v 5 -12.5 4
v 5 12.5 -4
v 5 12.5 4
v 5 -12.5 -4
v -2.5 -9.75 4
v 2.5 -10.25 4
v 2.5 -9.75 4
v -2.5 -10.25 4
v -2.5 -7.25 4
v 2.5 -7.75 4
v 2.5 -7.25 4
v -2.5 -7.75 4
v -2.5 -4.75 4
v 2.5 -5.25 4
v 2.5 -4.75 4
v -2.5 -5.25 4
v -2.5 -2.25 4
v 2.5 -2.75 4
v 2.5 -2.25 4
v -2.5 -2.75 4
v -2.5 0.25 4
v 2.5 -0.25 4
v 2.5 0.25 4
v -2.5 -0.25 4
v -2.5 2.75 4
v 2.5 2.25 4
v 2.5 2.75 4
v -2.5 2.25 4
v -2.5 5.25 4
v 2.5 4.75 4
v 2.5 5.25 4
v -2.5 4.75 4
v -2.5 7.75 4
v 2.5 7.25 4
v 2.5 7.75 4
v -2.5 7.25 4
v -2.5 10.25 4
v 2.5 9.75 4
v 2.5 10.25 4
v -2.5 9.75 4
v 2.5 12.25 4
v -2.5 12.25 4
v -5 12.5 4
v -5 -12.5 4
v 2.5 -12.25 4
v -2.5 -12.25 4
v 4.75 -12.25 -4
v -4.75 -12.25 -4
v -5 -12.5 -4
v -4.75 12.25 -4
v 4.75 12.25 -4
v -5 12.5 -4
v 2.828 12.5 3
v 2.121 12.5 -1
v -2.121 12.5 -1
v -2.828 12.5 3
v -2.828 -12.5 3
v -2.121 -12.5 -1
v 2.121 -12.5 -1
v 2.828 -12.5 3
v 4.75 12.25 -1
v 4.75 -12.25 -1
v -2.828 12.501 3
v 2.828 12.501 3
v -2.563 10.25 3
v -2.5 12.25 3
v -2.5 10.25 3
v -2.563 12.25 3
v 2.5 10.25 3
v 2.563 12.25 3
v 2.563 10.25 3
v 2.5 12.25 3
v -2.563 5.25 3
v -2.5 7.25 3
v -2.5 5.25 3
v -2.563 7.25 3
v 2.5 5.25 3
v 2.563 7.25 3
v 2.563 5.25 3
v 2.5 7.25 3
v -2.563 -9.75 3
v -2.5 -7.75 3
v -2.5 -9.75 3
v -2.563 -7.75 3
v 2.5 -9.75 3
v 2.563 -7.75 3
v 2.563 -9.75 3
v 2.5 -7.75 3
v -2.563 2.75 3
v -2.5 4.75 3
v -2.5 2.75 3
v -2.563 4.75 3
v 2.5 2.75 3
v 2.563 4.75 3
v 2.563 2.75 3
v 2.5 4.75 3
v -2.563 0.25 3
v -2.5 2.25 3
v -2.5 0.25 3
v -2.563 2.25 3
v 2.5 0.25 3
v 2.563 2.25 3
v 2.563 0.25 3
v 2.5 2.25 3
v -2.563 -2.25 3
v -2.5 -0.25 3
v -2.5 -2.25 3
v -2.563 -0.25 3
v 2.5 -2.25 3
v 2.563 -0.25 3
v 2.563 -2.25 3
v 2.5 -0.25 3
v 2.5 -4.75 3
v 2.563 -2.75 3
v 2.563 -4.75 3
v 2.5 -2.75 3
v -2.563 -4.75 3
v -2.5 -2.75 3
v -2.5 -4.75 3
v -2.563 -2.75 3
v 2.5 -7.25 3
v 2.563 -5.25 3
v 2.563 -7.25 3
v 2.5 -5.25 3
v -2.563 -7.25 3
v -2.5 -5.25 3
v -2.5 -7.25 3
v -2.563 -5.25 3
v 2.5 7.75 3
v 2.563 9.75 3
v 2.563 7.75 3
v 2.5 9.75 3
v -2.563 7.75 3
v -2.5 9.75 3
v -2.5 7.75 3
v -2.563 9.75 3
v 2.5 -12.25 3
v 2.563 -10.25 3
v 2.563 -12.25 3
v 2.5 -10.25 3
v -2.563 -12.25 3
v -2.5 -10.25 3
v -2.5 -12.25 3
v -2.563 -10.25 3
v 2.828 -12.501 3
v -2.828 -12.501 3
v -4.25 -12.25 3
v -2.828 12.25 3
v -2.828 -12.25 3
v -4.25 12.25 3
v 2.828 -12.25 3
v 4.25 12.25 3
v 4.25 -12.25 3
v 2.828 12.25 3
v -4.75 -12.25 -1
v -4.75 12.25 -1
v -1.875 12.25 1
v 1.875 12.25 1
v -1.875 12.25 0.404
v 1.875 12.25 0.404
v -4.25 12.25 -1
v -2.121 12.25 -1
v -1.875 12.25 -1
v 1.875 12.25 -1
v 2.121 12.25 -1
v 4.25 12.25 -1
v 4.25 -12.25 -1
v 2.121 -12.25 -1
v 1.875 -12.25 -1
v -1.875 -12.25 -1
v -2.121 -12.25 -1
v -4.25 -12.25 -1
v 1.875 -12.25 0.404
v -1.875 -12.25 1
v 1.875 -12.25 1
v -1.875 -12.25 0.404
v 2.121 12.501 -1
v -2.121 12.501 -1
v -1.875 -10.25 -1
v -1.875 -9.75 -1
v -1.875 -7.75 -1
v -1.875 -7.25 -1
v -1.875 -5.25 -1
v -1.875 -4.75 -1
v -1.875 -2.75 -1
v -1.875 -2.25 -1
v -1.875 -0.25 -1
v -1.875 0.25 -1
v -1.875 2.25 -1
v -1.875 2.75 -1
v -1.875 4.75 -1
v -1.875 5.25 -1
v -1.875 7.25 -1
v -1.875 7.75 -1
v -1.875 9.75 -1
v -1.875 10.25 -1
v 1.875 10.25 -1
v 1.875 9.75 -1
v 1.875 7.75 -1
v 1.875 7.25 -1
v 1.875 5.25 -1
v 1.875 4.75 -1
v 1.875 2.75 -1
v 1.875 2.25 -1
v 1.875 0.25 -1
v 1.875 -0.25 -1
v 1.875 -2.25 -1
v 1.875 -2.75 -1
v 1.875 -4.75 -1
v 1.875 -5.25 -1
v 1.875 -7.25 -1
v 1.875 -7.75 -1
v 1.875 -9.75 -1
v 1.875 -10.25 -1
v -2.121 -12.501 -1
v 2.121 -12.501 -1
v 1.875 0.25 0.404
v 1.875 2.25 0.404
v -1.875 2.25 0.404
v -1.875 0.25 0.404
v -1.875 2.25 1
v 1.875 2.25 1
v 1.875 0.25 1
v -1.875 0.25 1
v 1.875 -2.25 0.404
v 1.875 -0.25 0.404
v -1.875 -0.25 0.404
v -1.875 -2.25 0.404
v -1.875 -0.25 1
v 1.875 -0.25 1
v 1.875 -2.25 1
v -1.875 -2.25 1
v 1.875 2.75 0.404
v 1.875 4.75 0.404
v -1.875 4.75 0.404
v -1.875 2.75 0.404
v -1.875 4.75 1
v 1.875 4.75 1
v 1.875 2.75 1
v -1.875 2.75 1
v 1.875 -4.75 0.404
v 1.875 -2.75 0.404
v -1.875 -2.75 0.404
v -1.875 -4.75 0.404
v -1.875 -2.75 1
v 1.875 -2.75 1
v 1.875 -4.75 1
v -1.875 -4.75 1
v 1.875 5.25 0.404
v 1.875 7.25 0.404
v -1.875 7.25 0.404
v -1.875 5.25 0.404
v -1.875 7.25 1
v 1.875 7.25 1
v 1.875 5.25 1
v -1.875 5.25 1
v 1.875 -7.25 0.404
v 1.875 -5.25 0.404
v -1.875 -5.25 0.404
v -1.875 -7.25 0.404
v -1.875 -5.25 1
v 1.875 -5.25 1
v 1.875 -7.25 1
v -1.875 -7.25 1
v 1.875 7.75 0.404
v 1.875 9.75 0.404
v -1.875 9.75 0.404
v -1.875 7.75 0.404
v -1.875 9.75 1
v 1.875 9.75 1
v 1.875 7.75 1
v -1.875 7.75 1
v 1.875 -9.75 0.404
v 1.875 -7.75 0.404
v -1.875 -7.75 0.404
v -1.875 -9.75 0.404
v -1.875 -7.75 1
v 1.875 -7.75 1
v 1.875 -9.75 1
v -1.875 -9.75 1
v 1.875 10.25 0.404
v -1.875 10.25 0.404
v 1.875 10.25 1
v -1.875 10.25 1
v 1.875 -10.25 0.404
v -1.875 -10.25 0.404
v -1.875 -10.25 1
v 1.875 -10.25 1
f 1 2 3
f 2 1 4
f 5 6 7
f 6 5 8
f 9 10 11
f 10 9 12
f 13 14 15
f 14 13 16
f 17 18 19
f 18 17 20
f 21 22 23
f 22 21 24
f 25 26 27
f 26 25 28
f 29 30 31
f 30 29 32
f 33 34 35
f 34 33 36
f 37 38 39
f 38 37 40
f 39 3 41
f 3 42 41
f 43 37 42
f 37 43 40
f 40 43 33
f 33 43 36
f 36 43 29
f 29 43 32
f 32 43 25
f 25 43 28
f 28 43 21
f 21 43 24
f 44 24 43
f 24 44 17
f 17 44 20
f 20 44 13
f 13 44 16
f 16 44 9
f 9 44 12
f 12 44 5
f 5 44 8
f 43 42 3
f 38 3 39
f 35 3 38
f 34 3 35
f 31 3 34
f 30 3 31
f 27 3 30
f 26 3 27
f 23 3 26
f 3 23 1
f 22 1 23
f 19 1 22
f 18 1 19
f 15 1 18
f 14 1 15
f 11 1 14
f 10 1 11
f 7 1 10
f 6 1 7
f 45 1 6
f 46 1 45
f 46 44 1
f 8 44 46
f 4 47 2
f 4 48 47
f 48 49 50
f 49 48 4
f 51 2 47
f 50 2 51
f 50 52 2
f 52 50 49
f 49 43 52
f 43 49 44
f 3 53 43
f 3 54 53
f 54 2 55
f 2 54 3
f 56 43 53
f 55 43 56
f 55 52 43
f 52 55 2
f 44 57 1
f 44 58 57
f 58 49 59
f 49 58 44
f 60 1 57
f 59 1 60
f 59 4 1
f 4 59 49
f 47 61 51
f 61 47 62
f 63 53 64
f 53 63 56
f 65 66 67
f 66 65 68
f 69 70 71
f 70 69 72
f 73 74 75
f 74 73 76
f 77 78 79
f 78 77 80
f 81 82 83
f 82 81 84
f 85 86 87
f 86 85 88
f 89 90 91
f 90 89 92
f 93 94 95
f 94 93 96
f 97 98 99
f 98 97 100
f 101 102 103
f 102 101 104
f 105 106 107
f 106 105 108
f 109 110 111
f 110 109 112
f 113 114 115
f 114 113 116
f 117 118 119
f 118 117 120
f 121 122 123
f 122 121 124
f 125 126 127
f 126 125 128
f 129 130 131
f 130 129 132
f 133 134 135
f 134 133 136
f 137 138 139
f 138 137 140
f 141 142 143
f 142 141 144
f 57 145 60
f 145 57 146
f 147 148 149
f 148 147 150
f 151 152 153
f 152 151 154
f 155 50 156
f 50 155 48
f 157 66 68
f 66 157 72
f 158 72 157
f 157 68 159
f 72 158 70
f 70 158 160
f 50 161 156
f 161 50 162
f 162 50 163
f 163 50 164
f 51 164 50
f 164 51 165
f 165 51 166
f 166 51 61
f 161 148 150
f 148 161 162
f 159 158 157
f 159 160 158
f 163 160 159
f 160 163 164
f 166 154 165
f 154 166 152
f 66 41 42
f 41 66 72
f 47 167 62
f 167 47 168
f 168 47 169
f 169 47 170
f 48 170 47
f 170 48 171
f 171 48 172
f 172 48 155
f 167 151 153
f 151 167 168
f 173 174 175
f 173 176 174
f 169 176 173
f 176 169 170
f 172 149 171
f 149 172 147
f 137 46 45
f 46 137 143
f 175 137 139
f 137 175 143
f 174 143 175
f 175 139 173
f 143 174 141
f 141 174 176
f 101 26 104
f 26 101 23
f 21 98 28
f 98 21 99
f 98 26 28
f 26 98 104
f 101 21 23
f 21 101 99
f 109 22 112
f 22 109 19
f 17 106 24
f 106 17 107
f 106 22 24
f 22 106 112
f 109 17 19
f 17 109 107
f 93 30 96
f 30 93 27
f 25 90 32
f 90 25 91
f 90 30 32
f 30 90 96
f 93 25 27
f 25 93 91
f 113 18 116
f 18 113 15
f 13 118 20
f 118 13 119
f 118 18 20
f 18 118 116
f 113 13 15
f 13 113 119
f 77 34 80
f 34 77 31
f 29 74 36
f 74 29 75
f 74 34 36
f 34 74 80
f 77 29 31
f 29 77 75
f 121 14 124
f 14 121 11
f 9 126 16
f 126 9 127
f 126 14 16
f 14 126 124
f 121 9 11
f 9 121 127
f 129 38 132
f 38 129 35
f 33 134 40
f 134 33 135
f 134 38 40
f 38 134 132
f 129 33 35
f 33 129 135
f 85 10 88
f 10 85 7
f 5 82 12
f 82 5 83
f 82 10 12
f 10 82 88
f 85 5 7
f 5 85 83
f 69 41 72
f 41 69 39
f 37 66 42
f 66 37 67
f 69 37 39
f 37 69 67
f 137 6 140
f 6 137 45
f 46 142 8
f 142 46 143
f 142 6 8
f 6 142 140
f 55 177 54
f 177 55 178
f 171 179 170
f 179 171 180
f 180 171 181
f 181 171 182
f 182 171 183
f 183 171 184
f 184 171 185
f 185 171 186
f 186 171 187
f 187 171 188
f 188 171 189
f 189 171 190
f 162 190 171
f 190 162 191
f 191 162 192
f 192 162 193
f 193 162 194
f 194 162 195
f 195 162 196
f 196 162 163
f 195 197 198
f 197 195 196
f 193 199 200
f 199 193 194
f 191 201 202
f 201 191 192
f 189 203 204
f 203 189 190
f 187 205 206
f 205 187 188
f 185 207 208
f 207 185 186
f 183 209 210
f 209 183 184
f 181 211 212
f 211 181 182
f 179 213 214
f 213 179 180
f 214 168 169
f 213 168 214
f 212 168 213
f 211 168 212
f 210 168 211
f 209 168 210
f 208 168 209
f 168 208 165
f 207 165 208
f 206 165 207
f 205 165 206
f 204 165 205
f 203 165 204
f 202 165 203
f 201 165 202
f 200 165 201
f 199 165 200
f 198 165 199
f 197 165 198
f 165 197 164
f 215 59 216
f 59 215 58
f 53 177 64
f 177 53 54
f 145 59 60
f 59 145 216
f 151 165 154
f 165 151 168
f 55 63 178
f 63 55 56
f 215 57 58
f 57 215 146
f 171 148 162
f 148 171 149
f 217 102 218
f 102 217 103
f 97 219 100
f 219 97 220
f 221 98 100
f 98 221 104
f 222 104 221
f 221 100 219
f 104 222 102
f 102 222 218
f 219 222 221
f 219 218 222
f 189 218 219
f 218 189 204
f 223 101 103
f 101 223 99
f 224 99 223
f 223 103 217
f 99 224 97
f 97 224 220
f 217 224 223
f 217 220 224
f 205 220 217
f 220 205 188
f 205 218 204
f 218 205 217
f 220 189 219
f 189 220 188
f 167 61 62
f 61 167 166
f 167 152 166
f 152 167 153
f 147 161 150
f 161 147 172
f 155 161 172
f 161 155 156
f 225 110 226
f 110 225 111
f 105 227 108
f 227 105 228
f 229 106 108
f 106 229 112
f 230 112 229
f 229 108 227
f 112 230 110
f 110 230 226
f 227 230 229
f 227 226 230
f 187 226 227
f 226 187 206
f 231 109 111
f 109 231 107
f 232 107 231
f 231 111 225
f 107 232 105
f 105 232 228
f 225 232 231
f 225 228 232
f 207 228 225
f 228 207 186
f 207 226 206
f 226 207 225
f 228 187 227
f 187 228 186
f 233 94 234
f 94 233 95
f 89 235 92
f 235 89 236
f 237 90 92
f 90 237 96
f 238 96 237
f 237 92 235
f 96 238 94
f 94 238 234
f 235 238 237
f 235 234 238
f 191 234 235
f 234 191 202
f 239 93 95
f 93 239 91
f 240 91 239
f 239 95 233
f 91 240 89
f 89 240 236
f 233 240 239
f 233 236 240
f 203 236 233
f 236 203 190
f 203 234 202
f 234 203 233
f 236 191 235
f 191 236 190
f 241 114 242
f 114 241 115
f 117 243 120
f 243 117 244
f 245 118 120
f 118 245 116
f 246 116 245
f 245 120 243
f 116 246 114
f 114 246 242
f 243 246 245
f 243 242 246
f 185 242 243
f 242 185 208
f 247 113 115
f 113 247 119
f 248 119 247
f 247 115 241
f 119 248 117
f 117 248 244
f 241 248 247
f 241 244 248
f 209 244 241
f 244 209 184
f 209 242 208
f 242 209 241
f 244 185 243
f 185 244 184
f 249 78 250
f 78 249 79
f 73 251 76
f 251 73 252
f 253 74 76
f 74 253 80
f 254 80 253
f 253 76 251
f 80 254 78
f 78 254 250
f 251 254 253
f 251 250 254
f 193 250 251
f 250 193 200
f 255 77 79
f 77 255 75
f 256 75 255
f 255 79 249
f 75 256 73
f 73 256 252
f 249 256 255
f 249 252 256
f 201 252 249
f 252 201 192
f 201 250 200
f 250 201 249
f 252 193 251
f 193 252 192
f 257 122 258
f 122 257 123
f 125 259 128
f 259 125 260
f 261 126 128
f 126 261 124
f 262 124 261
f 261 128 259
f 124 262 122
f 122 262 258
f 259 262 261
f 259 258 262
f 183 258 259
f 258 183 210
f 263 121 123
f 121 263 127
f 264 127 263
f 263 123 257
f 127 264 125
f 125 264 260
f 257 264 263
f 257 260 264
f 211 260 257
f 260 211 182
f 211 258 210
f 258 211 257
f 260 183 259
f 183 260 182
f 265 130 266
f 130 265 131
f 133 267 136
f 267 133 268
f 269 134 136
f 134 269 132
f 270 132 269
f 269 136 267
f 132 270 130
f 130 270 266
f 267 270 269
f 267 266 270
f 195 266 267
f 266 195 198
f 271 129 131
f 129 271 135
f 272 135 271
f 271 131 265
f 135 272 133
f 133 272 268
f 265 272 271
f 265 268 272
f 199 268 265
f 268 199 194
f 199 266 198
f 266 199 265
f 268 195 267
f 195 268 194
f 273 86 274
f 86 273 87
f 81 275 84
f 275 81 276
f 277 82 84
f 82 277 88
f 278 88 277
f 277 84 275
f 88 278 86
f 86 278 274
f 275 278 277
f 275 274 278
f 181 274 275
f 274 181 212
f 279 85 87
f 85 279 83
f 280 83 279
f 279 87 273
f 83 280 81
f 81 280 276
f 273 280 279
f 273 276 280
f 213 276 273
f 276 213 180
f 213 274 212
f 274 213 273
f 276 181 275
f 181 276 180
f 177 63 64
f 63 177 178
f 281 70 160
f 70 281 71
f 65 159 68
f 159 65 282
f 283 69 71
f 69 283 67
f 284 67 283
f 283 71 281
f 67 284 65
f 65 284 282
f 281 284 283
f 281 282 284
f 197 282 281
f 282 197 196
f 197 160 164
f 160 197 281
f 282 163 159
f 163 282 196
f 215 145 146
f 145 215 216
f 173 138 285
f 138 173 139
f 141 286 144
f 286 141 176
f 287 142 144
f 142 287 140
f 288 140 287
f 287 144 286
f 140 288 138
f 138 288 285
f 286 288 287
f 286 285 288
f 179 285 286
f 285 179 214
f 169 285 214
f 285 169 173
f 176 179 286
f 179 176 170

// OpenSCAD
$fn=50;
$t=true;        //Abbreviation
$wth=.5;        //Wall Thickness
$l=25;          //Length
$w=10;          //Width
$h=8;           //Height
$ow=5;          //LED Opening Width
$oiw=3.5;       //LED Opening Inside Width
$ol=2;          //LED Opening length
$os=.5;         //LED Opening Spacing
$ols=$ol+$os;   //Distance per LED
$olso=$ols/2;   //Offset for Center
$od=4;          //LED Opening Depth

module ledopening() {
    cube([$ow,$ol,$wth*4], center=$t);
}

module ledconduit() {
    difference() {
        difference() {
            rotate([0,0,45]) cylinder($h/2, $oiw-.5, $ow-1, $fn=4, center=$t);
            translate([0,3.751,0]) cube([$ow*2,$ow,$ow], center=$t);
            translate([0,-3.751,0]) cube([$ow*2,$ow,$ow], center=$t);
        }
        difference() {
            rotate([0,0,45]) translate([0,0,1]) cylinder($h/2, $oiw-1, $ow-1, $fn=4, center=$t);
            translate([0,3.5,1]) cube([$ow*2,$ow,$ow], center=$t);
            translate([0,-3.5,.51]) cube([$ow*2,$ow,$ow], center=$t);
        }
        translate([0,0,-1]) cube([$ow-$olso,$ol,$h/4], center=$t);
    }
    translate([4.5,0,0]) cube([.5,2.5,4], center=$t);
    translate([-4.5,0,0]) cube([.5,2.5,4], center=$t);
}

difference() {
    cube([$w,$l,$h], center=$t);
    translate([0,0,-$wth*2]) cube([$w-$wth,$l-$wth,$h], center=$t);
    translate([0,$olso,$h/2]) ledopening();         //LED #5
    translate([0,-$olso,$h/2]) ledopening();        //LED #6
    translate([0,$olso+$ols,$h/2]) ledopening();    //LED #4
    translate([0,-$olso-$ols,$h/2]) ledopening();   //LED #7
    translate([0,$olso+$ols*2,$h/2]) ledopening();  //LED #3
    translate([0,-$olso-$ols*2,$h/2]) ledopening(); //LED #8
    translate([0,$olso+$ols*3,$h/2]) ledopening();  //LED #2
    translate([0,-$olso-$ols*3,$h/2]) ledopening(); //LED #9
    translate([0,$olso+$ols*4,$h/2]) ledopening();  //LED #1
    translate([0,-$olso-$ols*4,$h/2]) ledopening(); //LED #10
}
//translate([0,$olso,$h]) ledconduit();
translate([0,$olso,1]) ledconduit();                //LED Conduit #5
translate([0,-$olso,1]) ledconduit();               //LED Conduit #6
translate([0,$olso+$ols,1]) ledconduit();           //LED Conduit #4
translate([0,-$olso-$ols,1]) ledconduit();          //LED Conduit #7
translate([0,$olso+$ols*2,1]) ledconduit();         //LED Conduit #3
translate([0,-$olso-$ols*2,1]) ledconduit();        //LED Conduit #8
translate([0,$olso+$ols*3,1]) ledconduit();         //LED Conduit #2
translate([0,-$olso-$ols*3,1]) ledconduit();        //LED Conduit #9
translate([0,$olso+$ols*4,1]) ledconduit();         //LED Conduit #1
translate([0,-$olso-$ols*4,1]) ledconduit();        //LED Conduit #10
